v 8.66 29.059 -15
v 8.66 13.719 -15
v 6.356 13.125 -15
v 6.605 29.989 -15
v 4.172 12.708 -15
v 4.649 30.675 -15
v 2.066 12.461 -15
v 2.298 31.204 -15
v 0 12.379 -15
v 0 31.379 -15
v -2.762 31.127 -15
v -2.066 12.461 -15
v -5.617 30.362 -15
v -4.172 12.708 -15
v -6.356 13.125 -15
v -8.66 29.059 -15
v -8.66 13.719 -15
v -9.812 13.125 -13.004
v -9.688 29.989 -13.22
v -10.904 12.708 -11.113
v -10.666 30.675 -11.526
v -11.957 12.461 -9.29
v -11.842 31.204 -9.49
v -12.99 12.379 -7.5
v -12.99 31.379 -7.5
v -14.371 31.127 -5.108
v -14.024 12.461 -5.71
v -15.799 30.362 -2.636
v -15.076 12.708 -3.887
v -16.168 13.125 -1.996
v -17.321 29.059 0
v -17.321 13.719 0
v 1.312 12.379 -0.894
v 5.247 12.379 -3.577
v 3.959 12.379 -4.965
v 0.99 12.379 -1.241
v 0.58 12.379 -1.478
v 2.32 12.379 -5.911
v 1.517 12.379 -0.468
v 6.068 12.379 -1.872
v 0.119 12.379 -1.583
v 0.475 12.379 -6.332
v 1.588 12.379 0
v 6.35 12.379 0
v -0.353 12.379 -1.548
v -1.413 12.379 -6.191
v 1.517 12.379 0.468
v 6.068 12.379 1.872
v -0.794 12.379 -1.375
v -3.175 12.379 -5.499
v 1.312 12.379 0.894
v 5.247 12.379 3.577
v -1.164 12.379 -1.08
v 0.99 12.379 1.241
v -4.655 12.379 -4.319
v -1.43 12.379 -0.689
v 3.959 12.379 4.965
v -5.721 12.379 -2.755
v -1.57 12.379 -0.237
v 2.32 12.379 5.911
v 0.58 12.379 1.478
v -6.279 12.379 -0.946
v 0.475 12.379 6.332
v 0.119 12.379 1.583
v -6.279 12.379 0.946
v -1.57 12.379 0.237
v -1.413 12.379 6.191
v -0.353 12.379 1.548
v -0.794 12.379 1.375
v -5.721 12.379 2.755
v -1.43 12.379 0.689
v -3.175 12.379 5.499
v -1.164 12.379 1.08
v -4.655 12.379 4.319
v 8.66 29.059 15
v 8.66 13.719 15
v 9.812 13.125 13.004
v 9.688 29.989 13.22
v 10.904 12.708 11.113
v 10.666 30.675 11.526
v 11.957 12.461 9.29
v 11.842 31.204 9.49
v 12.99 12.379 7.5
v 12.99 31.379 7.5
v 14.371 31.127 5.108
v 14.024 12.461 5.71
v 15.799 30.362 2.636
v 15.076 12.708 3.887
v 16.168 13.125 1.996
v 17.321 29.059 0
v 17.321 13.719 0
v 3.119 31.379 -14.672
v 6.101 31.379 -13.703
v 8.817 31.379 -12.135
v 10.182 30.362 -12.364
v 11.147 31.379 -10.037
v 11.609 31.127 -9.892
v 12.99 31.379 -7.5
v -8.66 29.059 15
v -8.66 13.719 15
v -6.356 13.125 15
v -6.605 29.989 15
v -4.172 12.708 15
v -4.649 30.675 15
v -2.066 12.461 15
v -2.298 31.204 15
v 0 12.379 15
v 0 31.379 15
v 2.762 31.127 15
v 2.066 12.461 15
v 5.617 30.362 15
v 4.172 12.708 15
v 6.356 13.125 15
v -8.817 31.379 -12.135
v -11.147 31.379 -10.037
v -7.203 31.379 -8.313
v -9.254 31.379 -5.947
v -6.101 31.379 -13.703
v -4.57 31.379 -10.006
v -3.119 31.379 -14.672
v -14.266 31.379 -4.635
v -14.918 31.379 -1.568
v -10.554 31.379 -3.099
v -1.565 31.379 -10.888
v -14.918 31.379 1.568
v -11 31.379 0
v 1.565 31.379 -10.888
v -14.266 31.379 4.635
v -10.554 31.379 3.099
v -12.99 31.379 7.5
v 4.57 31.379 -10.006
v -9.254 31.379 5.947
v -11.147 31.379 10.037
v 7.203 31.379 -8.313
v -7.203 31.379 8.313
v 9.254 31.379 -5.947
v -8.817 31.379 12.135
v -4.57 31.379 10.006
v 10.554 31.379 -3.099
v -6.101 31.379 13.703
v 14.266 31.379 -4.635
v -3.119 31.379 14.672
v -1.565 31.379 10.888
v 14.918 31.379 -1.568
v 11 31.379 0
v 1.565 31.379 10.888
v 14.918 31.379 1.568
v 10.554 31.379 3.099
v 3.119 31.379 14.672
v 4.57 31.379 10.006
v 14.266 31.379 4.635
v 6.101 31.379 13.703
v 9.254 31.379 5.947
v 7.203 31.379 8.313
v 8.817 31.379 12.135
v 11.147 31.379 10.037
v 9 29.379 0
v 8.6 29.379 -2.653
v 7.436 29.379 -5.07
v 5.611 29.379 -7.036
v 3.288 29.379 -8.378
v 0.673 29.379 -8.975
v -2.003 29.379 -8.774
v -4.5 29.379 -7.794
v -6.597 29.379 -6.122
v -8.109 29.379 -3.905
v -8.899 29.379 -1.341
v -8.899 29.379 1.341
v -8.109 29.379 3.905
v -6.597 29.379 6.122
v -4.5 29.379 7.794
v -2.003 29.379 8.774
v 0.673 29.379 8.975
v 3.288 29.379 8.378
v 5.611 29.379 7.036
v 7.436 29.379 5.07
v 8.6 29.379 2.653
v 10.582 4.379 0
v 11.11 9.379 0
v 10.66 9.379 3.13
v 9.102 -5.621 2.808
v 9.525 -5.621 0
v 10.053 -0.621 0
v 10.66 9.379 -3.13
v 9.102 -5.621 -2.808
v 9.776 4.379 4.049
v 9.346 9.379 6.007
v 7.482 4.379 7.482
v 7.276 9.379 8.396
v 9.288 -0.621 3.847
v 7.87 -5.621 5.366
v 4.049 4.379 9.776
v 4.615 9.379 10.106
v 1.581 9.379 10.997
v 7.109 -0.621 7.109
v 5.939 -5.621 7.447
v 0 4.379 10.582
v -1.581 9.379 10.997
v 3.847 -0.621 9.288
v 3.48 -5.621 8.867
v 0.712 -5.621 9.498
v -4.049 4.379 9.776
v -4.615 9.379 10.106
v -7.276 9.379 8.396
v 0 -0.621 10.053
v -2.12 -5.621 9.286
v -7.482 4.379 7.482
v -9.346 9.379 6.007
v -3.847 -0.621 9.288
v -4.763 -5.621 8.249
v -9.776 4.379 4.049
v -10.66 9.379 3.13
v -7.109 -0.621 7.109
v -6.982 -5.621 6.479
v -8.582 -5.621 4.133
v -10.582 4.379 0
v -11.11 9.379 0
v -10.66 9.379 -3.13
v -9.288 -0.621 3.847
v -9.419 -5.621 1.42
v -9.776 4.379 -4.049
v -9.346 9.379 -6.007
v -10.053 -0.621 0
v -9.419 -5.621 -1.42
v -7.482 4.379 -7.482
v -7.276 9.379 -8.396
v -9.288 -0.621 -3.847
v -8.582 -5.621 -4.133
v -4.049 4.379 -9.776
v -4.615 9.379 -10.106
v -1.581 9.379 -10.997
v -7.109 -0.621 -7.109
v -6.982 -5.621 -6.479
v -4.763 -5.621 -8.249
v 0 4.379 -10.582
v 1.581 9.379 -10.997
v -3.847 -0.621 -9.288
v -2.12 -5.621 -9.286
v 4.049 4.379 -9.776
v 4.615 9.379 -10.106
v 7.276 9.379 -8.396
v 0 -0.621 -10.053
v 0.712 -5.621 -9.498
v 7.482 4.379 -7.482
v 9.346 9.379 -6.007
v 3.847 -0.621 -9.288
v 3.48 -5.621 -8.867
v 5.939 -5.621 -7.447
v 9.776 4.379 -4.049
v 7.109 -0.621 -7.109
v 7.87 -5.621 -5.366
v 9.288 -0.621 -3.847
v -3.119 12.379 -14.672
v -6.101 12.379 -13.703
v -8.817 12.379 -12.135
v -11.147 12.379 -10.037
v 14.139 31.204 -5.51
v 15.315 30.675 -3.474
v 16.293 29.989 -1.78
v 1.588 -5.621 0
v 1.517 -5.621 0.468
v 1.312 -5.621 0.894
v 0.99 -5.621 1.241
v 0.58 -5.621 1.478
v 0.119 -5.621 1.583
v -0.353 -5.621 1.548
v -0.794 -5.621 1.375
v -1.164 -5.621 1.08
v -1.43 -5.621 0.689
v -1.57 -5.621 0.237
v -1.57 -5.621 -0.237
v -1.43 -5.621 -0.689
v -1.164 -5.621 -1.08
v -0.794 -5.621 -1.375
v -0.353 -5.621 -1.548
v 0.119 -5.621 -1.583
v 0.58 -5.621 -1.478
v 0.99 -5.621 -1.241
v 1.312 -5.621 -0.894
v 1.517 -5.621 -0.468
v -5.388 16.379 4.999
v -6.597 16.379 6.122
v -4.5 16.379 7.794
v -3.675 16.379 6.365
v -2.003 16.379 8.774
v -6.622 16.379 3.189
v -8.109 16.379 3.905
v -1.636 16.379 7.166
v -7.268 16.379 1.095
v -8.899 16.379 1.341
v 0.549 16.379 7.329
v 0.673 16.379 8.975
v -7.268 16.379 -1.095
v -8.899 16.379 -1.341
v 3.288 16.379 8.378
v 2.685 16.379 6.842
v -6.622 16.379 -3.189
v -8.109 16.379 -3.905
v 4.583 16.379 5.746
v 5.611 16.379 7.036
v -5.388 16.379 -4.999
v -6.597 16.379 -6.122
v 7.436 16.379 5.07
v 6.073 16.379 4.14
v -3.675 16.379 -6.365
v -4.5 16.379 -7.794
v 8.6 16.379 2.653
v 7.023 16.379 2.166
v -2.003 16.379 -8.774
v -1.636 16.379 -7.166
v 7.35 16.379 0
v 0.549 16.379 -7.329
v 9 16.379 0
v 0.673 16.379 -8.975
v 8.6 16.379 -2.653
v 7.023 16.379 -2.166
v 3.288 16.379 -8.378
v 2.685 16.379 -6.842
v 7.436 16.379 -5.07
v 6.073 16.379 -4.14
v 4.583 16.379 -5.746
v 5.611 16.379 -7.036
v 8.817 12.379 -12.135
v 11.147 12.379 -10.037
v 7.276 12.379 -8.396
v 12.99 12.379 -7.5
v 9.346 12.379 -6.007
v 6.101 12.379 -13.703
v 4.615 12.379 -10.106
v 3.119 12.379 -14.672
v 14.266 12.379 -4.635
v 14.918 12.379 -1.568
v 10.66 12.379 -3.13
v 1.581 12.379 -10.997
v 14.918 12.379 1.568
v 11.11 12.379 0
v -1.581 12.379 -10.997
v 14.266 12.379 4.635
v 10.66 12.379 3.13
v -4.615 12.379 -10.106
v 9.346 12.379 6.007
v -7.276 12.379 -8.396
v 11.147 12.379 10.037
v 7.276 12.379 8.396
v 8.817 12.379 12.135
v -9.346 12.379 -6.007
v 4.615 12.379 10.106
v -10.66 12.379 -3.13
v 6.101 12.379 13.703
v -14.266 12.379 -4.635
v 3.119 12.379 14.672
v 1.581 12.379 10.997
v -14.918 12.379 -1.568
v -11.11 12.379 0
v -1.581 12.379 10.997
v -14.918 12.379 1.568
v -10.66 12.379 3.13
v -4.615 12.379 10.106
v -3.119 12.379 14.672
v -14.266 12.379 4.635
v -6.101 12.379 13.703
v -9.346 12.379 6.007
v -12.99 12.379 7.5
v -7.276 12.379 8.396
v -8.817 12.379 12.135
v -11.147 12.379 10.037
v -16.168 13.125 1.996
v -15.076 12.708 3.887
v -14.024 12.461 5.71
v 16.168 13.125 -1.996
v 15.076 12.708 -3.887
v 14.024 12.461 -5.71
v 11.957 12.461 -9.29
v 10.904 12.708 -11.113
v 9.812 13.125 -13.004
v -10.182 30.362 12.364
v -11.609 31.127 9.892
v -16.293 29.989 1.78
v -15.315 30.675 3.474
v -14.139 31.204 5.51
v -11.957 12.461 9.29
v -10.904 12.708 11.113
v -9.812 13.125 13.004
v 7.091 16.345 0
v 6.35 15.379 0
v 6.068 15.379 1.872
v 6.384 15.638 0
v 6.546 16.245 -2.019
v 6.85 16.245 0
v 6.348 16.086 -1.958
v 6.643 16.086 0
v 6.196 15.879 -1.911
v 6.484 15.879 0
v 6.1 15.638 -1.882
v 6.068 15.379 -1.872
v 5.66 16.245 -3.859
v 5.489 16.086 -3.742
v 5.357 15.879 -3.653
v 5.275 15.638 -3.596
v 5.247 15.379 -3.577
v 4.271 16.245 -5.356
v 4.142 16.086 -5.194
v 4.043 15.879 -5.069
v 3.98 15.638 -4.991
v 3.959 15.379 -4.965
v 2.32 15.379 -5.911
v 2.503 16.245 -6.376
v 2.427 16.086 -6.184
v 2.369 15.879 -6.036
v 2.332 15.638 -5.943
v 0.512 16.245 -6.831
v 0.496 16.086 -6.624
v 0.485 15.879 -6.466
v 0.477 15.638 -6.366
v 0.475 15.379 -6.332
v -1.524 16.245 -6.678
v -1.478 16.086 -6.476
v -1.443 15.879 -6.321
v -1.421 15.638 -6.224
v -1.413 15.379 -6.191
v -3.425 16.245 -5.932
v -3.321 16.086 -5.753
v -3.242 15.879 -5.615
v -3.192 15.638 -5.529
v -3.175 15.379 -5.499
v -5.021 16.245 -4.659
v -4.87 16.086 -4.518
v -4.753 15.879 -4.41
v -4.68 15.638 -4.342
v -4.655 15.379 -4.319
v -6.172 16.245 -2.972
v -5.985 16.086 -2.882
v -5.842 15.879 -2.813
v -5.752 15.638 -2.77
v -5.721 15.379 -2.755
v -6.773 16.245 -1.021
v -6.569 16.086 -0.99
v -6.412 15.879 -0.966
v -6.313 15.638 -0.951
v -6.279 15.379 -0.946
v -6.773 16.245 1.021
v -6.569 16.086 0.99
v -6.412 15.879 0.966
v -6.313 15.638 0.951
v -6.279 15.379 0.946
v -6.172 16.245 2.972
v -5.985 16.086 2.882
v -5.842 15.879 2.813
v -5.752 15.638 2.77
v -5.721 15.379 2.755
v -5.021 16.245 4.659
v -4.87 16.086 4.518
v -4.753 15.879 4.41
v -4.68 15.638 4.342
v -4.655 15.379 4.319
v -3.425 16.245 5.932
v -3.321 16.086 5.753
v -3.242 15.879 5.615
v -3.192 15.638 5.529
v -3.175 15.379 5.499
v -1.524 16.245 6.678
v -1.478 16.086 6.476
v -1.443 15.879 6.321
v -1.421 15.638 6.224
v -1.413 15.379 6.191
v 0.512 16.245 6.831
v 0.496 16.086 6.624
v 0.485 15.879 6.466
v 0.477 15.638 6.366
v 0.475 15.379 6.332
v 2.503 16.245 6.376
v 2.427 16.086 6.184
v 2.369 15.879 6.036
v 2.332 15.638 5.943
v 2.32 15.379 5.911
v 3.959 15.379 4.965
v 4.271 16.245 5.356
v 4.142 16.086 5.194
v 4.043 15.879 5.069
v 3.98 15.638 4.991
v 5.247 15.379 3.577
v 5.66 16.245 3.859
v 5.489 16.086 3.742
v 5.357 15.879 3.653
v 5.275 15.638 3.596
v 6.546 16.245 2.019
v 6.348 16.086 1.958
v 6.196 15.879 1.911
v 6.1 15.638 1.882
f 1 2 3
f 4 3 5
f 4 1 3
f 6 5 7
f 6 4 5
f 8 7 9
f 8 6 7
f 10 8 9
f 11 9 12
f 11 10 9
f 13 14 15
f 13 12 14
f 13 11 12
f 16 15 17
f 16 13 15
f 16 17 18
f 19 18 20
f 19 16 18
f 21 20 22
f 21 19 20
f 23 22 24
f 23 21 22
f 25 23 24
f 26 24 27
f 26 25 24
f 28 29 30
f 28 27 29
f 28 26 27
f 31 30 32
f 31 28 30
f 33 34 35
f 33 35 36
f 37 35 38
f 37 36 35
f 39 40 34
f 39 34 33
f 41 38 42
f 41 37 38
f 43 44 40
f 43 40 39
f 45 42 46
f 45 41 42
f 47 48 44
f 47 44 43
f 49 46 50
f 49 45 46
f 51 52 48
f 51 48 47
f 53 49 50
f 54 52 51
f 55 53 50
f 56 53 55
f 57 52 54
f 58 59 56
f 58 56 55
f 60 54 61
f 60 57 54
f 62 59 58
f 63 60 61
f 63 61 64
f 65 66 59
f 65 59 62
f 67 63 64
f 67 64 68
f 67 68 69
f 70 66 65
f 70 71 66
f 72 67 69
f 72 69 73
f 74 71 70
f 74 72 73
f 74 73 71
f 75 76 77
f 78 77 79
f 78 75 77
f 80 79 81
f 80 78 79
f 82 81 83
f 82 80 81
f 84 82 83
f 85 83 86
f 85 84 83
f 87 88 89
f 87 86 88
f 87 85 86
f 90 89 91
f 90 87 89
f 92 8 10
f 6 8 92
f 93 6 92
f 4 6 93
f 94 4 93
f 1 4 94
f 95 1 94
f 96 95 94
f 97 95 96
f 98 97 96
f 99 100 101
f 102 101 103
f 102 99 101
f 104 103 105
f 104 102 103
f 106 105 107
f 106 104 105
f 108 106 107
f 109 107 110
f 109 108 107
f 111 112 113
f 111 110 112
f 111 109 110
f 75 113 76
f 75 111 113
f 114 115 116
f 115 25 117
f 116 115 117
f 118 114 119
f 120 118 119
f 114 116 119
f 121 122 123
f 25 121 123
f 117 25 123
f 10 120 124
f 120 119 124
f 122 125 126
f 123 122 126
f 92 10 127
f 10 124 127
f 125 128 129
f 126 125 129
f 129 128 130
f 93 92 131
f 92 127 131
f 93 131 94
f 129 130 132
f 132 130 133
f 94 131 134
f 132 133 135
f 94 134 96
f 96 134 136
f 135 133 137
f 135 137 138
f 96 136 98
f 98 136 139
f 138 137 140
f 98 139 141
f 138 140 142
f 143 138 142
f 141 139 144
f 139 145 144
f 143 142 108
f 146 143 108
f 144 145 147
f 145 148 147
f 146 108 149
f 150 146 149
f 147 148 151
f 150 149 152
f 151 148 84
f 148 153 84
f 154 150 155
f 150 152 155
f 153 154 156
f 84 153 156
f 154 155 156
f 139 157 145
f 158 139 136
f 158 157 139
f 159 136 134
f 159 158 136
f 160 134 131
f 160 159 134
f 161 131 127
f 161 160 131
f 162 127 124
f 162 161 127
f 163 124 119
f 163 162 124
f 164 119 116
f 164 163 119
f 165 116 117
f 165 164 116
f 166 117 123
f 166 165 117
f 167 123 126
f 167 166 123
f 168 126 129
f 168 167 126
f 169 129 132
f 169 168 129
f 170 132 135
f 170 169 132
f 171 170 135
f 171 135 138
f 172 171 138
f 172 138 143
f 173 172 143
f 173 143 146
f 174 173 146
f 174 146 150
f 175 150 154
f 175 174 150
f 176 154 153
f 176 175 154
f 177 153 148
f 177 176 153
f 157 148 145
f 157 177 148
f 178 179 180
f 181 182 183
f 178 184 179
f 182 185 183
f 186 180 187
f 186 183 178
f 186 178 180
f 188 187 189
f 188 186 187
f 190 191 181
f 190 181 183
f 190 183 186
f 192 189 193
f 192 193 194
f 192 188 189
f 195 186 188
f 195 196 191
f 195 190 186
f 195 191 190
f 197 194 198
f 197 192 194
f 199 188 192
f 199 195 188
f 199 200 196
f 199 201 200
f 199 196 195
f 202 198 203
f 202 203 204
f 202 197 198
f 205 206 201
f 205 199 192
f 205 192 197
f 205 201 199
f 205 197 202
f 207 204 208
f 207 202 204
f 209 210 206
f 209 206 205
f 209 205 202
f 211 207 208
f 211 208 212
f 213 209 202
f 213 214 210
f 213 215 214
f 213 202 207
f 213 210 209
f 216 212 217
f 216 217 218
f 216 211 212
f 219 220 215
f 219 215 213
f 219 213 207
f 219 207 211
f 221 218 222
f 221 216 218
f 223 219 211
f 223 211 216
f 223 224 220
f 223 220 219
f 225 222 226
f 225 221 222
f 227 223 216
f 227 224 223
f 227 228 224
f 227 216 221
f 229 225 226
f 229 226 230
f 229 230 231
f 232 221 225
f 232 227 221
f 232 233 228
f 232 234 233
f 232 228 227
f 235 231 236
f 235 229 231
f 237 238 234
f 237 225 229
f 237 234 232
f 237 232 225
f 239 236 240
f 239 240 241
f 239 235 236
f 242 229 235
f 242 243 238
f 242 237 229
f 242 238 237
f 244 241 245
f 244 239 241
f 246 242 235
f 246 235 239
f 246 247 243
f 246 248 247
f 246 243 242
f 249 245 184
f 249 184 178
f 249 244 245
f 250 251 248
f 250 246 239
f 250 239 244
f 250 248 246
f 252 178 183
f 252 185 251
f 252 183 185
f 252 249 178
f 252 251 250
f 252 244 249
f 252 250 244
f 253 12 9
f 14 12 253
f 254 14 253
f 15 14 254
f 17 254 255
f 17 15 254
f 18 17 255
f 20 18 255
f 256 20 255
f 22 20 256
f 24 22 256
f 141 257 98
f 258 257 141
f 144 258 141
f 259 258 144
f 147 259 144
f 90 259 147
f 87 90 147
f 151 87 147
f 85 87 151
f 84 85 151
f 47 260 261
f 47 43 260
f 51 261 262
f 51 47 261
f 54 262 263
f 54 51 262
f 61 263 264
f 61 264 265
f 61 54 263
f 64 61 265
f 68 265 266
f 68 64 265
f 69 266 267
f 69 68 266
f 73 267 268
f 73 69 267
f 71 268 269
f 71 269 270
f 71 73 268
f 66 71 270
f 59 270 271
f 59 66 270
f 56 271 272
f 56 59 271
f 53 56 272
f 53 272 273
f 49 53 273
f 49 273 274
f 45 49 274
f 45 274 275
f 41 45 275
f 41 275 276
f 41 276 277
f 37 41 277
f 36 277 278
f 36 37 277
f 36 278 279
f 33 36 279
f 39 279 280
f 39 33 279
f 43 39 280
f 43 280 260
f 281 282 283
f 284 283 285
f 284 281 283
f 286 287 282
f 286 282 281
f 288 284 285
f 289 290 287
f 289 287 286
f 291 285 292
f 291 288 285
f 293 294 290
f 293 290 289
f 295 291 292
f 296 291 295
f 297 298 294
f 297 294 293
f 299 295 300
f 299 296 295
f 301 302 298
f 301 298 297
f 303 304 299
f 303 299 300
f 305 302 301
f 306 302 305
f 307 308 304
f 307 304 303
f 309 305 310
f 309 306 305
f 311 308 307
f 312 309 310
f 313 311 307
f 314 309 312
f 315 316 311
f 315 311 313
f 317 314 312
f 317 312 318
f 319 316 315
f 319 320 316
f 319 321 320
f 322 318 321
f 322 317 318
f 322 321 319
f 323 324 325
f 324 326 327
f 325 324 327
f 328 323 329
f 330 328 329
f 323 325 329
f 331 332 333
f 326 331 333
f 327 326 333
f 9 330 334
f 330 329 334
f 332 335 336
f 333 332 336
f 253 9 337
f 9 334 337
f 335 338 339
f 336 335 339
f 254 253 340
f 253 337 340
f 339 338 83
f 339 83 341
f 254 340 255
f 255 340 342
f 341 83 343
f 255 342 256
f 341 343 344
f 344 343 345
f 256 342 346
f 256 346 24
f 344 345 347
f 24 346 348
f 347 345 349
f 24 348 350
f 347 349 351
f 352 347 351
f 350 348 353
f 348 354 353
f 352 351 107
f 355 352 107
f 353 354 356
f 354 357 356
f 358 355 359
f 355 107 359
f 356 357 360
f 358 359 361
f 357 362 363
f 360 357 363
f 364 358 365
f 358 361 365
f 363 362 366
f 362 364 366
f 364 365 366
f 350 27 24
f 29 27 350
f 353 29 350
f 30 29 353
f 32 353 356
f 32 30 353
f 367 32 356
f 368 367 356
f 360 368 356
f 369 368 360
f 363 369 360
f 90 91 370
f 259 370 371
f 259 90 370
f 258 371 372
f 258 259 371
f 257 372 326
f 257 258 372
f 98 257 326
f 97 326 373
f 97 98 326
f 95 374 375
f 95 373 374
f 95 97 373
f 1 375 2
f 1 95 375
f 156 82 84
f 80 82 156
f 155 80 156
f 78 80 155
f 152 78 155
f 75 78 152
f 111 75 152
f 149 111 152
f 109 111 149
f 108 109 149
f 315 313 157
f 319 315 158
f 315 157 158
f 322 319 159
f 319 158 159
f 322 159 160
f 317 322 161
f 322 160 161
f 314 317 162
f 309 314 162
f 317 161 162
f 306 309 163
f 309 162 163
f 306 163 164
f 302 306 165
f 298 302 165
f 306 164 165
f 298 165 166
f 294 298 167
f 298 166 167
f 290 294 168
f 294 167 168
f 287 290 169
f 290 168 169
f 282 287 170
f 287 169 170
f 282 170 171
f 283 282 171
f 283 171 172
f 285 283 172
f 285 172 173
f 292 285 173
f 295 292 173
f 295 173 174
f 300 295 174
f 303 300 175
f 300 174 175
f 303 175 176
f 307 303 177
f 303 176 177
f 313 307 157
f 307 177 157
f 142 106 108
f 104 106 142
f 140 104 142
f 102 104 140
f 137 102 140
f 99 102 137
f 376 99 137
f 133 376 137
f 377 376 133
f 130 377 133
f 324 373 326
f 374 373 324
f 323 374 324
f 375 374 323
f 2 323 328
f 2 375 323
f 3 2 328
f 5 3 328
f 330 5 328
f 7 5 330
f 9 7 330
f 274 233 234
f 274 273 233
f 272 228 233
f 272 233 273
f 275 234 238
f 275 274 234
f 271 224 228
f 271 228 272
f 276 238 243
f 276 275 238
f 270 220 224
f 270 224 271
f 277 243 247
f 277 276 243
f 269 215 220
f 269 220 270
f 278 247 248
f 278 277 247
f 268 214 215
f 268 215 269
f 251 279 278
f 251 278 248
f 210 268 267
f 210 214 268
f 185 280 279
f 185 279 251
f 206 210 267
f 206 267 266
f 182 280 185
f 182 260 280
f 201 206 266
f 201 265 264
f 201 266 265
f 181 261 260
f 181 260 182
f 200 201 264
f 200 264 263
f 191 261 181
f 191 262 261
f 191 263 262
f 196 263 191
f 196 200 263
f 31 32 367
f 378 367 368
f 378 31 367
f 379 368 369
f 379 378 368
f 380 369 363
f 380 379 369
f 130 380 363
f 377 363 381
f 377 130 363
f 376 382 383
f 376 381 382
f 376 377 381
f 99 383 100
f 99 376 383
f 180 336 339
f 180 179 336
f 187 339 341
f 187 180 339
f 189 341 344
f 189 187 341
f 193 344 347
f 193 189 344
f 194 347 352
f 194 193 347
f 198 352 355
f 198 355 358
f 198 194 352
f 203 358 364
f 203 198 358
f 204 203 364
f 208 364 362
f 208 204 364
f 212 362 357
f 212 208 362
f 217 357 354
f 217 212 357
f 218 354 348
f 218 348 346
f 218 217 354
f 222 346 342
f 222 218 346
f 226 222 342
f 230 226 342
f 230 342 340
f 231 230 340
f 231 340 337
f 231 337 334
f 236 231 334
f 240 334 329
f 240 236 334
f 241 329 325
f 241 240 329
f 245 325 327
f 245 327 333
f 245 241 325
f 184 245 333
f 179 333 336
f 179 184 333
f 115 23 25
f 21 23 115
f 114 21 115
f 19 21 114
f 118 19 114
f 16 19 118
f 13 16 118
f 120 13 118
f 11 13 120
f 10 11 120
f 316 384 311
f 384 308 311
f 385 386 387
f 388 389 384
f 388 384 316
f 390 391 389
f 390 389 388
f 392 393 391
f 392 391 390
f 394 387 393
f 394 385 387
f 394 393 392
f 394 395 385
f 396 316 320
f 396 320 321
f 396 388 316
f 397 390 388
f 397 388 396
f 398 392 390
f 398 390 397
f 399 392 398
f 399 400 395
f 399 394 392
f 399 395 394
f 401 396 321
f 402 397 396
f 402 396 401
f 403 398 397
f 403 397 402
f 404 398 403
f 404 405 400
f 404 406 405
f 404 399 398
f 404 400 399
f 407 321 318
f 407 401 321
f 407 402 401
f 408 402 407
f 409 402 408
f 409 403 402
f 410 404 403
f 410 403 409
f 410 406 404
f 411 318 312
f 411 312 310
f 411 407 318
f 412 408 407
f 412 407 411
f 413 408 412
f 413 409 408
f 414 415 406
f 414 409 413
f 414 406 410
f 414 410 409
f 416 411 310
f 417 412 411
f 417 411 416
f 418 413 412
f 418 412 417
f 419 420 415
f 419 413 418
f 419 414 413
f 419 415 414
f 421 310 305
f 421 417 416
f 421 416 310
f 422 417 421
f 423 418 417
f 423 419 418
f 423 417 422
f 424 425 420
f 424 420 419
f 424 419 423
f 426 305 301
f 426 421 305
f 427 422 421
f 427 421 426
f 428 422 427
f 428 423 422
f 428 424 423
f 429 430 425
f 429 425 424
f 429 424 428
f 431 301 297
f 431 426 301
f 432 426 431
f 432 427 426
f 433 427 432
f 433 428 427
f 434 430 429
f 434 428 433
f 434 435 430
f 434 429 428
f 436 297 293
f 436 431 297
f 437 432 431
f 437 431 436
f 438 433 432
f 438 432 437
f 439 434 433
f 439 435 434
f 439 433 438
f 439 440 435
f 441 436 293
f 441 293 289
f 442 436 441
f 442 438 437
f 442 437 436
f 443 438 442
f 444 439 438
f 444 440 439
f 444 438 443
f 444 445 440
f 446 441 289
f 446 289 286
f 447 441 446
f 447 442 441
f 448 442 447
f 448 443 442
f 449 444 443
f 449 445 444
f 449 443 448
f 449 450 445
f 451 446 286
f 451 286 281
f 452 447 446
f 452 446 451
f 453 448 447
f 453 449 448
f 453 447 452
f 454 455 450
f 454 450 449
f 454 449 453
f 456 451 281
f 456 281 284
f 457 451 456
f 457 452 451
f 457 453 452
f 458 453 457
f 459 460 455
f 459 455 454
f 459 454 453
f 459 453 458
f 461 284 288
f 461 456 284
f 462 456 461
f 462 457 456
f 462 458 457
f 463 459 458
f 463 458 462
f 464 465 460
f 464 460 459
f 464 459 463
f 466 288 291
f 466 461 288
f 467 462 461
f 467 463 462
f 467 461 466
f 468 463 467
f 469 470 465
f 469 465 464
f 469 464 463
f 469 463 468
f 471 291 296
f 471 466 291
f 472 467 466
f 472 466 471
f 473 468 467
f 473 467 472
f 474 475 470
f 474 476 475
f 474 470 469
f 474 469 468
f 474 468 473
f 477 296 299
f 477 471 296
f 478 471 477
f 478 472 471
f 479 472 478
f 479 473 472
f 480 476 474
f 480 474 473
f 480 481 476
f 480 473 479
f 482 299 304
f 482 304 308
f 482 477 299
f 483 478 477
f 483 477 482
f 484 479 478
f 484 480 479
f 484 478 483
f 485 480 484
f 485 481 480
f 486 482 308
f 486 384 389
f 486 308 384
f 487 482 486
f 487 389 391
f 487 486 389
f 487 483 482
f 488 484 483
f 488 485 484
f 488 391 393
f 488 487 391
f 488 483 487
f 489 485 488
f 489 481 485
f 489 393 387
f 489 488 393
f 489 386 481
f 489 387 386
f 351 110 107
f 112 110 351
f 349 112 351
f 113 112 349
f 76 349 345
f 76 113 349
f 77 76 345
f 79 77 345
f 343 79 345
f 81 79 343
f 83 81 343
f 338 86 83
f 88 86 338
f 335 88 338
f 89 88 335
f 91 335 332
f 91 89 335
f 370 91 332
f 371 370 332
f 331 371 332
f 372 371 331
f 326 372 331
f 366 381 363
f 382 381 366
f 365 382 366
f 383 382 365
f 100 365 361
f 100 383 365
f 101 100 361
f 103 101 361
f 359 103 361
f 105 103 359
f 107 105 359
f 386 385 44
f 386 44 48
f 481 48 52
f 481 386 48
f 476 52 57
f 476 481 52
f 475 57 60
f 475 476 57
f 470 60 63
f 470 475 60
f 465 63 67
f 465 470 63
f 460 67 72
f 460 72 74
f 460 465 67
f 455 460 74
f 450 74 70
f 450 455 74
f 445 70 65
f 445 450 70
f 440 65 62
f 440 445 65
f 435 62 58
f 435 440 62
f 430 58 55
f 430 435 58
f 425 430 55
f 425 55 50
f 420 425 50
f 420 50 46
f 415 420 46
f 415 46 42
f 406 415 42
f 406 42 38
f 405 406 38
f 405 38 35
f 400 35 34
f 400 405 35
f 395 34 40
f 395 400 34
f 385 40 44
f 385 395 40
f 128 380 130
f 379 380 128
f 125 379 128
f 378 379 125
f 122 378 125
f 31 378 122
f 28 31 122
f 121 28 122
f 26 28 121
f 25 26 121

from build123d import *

# Parameters (mm, degrees)
CROQUIS4_OUTSIDE_W    = 60.478
CROQUIS4_OUTSIDE_H    = 60.478
CORTAR_EXTRUIR6_DEPTH = 70
CROQUIS5_OUTSIDE_W    = 188.422
CROQUIS5_OUTSIDE_H    = 183.78
CROQUIS5_OUTSIDE_R    = 15
CORTAR_EXTRUIR7_DEPTH = 70
CORTAR_EXTRUIR7_TAPER = 45
CROQUIS6_R            = 9
CORTAR_EXTRUIR8_DEPTH = 15
CHAFL_N1_SIZE         = 2
REDONDEO1_R           = 1
CROQUIS7_OUTSIDE_W    = 83.062
CROQUIS7_OUTSIDE_H    = 78.42
CROQUIS7_OUTSIDE_R    = 15
CORTAR_EXTRUIR9_DEPTH = 10
CORTAR_EXTRUIR9_TAPER = 60


with BuildPart() as part:
    # Croquis1 → Revolución1 (revolve)
    with BuildSketch(Plane.XY):
        Polygon((6.35, 31.379194031), (20, 31.379194031), (22, 31.379194031), (22, 29.379194031), (22, 14.379194031), (22, 12.379194031), (20, 12.379194031), (14, 12.379194031), (11.11, 12.379194031), (11.11, 9.379194031), (9.525, -5.620805969), (1.5875, -5.620805969), (1.5875, 12.379194031), (6.35, 12.379194031), align=None)
    revolve(axis=Axis((0, 51.930492424, 0), (0, -1, 0)))

    # Croquis4 outside → Cortar-Extruir6 (cut)
    with BuildSketch(Plane(origin=(0, 31.379194031, 0), x_dir=(1, 0, 0), z_dir=(0, 1, 0))):
        Rectangle(CROQUIS4_OUTSIDE_W, CROQUIS4_OUTSIDE_H)
        Polygon((17.320508076, 0), (8.660254038, 15), (-8.660254038, 15), (-17.320508076, 0), (-8.660254038, -15), (8.660254038, -15), align=None, mode=Mode.SUBTRACT)
    extrude(amount=-CORTAR_EXTRUIR6_DEPTH, mode=Mode.SUBTRACT)

    # Croquis5 outside → Cortar-Extruir7 (cut)
    with BuildSketch(Plane(origin=(0, 31.379194031, 0), x_dir=(1, 0, 0), z_dir=(0, 1, 0))):
        Rectangle(CROQUIS5_OUTSIDE_W, CROQUIS5_OUTSIDE_H)
        Circle(CROQUIS5_OUTSIDE_R, mode=Mode.SUBTRACT)
    extrude(amount=-CORTAR_EXTRUIR7_DEPTH, taper=CORTAR_EXTRUIR7_TAPER, mode=Mode.SUBTRACT)

    # Croquis6 → Cortar-Extruir8 (cut)
    with BuildSketch(Plane(origin=(0, 31.379194031, 0), x_dir=(1, 0, 0), z_dir=(0, 1, 0))):
        Circle(CROQUIS6_R)
    extrude(amount=-CORTAR_EXTRUIR8_DEPTH, mode=Mode.SUBTRACT)

    # Chaflán1
    chafl_n1_edges = [part.edges().sort_by_distance(p)[0] for p in [
        (-9, 31.379194031, 0),
    ]]
    chamfer(chafl_n1_edges, length=CHAFL_N1_SIZE)

    # Redondeo1
    redondeo1_edges = [part.edges().sort_by_distance(p)[0] for p in [
        (-6.35, 16.379194031, 0),
    ]]
    fillet(redondeo1_edges, radius=REDONDEO1_R)

    # Croquis7 outside → Cortar-Extruir9 (cut)
    with BuildSketch(Plane.XZ.offset(-12.379194031)):
        Rectangle(CROQUIS7_OUTSIDE_W, CROQUIS7_OUTSIDE_H)
        Circle(CROQUIS7_OUTSIDE_R, mode=Mode.SUBTRACT)
    extrude(amount=-CORTAR_EXTRUIR9_DEPTH, taper=CORTAR_EXTRUIR9_TAPER, mode=Mode.SUBTRACT)


solid = part.part
